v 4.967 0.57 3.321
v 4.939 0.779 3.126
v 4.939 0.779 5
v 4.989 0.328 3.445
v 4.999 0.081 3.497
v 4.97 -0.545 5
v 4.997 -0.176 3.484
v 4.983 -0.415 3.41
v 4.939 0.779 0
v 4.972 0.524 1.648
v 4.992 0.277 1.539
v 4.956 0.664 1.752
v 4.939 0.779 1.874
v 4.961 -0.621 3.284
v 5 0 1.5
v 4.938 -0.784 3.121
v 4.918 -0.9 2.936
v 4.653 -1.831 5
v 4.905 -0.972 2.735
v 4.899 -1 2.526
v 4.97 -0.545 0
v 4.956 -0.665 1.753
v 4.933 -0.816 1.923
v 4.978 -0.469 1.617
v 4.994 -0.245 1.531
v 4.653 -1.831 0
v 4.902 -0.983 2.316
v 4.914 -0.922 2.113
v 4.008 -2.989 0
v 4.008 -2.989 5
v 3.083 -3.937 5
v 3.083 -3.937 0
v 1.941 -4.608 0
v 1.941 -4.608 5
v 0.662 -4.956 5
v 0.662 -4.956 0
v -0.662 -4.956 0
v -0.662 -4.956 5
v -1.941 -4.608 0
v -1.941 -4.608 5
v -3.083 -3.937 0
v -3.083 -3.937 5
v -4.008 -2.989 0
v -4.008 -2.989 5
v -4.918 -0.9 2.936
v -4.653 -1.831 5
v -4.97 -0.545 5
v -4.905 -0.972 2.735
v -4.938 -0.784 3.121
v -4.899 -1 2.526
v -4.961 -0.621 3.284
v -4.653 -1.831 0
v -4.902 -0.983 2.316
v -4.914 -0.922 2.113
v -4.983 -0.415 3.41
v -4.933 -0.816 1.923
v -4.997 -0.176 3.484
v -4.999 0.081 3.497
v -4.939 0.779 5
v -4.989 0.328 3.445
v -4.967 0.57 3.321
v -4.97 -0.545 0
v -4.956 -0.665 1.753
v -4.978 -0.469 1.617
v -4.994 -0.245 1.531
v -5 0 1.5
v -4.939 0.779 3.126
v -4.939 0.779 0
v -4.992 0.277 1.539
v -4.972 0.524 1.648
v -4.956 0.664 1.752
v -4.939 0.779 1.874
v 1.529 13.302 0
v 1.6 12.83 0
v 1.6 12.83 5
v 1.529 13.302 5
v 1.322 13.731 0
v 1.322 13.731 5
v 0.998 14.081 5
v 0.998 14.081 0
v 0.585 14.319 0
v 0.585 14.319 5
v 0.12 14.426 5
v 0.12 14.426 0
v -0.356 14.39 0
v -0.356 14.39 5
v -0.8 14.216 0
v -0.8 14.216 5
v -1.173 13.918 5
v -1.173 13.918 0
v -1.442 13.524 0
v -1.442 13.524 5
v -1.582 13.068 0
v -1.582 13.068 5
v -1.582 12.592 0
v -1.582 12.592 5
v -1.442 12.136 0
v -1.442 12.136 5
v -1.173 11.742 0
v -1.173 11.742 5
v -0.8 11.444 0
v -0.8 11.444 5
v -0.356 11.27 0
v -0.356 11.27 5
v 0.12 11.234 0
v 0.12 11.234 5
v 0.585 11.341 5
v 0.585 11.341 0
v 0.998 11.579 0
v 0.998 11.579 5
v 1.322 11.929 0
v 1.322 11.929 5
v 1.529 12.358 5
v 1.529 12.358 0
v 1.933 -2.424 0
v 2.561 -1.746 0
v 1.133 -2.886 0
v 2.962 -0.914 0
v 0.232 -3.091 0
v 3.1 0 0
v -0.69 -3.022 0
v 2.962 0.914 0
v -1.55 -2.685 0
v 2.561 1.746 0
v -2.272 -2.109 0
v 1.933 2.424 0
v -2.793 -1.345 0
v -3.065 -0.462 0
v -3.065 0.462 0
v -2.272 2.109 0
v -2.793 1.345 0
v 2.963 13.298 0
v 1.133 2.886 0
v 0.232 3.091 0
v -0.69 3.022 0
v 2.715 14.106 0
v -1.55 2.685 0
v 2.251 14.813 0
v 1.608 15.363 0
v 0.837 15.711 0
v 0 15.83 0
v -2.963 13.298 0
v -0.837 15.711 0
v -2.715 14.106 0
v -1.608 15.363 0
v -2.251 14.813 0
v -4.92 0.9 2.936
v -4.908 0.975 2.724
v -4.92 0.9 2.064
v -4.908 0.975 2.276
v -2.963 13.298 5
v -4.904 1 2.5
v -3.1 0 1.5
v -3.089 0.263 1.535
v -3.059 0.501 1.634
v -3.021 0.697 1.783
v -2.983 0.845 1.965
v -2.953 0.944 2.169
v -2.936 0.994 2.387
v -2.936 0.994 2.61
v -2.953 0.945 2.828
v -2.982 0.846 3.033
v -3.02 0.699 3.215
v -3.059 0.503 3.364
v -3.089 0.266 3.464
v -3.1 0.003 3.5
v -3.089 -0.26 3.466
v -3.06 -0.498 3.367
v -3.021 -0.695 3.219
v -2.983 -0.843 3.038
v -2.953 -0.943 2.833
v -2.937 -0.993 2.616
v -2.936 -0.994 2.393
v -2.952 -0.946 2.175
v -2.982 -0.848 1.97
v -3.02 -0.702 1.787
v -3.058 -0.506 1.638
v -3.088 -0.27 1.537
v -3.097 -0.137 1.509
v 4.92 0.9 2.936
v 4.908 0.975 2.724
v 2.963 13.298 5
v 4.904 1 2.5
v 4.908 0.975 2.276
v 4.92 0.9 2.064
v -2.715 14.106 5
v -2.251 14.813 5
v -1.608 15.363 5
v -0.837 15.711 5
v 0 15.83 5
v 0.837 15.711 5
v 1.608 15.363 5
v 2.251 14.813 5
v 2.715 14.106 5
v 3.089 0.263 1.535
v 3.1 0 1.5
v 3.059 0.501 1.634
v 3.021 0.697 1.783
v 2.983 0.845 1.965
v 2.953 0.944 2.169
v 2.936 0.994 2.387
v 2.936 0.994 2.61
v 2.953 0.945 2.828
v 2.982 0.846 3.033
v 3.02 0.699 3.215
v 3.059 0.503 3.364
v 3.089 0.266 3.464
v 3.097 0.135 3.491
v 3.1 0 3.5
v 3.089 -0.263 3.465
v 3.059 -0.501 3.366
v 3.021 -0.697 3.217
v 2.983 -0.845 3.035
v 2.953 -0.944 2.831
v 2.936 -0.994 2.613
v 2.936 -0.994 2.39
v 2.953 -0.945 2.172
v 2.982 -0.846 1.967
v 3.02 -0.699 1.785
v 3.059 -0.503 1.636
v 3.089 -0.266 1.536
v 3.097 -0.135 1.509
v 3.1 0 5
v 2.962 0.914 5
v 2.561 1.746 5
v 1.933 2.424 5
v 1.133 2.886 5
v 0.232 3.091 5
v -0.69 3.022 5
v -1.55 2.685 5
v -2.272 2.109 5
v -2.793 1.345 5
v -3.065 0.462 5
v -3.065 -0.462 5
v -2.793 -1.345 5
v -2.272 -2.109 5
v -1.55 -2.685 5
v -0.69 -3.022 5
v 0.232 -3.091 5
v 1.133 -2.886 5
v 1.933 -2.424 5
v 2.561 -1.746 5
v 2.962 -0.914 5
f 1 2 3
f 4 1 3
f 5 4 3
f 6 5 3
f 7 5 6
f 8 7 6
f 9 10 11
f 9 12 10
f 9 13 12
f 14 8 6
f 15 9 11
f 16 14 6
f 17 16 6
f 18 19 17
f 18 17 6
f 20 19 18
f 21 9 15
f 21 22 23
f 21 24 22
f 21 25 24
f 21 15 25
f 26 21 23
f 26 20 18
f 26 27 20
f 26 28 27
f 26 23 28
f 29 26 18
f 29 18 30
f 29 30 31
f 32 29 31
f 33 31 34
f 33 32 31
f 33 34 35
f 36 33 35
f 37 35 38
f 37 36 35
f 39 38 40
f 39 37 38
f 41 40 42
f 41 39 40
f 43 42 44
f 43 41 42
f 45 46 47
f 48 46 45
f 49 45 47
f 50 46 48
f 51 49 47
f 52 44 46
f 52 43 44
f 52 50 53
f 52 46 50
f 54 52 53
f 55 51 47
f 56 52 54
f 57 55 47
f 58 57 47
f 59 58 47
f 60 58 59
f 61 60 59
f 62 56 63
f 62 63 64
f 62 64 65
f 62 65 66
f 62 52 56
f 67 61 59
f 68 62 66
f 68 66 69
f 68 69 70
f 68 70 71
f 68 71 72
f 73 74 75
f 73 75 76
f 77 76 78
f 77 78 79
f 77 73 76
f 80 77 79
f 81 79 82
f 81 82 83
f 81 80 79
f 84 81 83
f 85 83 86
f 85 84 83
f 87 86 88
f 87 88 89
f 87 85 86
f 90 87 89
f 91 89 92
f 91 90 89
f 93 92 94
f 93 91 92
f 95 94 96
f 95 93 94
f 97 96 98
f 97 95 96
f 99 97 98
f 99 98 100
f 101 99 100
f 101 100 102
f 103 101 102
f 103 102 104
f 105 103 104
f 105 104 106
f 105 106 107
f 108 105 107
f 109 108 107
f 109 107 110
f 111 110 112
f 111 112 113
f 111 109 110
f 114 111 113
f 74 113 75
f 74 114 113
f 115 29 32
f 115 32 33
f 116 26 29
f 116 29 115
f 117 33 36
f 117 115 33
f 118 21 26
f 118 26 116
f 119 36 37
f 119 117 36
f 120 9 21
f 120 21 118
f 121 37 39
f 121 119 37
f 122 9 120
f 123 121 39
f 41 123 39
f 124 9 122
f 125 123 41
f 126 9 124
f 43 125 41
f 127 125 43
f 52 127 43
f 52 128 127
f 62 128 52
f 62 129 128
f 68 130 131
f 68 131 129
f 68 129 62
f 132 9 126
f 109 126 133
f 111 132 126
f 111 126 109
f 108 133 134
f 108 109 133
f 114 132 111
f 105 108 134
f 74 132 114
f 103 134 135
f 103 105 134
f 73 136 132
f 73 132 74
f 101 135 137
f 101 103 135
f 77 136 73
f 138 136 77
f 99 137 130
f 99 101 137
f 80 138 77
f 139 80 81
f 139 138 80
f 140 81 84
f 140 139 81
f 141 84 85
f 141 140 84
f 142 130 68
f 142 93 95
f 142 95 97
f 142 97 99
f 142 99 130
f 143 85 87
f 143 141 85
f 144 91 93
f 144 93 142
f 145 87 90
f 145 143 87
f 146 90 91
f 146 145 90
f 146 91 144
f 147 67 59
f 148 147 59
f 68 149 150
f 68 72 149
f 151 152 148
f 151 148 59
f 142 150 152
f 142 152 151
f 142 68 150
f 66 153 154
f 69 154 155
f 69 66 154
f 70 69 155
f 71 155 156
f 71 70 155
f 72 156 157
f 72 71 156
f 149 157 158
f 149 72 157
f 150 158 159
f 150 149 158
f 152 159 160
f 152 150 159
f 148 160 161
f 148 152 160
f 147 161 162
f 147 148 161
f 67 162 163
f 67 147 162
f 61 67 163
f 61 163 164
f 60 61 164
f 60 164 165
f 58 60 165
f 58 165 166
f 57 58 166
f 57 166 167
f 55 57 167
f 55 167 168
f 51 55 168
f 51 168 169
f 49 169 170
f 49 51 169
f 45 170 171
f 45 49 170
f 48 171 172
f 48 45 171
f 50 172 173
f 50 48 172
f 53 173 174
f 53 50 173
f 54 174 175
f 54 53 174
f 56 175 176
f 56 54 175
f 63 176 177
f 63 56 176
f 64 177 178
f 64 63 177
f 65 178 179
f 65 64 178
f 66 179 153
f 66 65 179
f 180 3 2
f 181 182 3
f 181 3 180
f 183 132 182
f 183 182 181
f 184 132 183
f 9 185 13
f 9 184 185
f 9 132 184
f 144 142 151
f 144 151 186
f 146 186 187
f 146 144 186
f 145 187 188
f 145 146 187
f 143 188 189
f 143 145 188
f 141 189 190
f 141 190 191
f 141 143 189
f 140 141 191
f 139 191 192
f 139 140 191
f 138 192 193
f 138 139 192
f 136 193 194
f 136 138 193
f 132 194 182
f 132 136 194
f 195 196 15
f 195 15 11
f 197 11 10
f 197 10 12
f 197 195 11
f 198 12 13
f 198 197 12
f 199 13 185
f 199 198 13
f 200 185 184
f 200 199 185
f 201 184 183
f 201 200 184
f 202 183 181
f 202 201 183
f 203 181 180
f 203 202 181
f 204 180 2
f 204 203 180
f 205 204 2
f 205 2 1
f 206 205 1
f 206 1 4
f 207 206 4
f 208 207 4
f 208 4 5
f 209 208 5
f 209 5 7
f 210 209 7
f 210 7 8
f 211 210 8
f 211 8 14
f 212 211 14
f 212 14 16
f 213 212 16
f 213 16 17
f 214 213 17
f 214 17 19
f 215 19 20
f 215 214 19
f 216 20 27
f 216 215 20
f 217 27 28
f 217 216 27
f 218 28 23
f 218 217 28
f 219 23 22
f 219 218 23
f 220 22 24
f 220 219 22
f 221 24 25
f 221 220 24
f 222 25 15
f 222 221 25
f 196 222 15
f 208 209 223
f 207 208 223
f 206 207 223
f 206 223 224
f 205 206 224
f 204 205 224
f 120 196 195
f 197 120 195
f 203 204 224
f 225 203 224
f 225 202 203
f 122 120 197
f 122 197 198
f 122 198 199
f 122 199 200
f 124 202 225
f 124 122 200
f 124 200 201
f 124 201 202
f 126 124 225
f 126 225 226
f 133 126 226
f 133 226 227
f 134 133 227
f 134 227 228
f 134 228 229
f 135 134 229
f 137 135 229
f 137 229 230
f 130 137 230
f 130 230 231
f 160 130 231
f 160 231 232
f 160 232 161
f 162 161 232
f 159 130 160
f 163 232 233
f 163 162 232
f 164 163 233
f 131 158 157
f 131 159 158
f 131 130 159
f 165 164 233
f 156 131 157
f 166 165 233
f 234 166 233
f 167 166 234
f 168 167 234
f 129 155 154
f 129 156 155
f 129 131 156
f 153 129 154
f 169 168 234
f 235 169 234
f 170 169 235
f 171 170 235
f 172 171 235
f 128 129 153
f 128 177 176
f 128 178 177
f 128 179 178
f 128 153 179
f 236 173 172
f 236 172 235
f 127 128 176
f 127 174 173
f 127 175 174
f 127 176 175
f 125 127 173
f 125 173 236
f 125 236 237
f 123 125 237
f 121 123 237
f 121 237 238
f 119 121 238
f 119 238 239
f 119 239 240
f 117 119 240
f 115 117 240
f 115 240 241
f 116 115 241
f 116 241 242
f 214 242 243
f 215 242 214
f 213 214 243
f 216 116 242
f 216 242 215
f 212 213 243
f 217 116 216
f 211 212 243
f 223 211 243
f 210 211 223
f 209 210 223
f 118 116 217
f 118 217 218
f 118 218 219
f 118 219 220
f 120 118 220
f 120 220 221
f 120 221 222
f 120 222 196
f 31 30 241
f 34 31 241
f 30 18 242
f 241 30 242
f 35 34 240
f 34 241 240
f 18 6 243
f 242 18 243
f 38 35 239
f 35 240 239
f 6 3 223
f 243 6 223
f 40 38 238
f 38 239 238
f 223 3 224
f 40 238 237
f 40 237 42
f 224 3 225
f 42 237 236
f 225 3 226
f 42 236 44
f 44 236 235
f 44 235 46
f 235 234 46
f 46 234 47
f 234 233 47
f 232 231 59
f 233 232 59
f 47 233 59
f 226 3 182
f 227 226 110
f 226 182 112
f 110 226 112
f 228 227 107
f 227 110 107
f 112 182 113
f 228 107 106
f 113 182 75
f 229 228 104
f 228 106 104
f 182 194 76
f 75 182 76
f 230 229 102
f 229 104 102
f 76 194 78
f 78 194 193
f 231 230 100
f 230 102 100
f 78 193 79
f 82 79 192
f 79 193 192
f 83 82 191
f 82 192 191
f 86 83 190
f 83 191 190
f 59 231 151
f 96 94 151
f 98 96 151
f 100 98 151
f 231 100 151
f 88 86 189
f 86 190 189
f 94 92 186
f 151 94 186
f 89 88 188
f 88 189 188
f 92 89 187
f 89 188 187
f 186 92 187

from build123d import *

# Parameters (mm, degrees)
CROQUIS1_R                 = 3.1
CROQUIS1_R_2               = 1.6
SALIENTE_EXTRUIR1_DEPTH    = 5
CORTAR_EXTRUIR1_DEPTH      = 18.33749982
CORTAR_EXTRUIR1_DEPTH_BACK = 18.33749982
CROQUIS3_R                 = 1


with BuildPart() as part:
    # Croquis1 → Saliente-Extruir1 (new body)
    with BuildSketch(Plane.XY):
        with BuildLine():
            Line((-4.938876333, 0.779423227), (-2.9633258, 13.297653936))
            ThreePointArc((-2.9633258, 13.297653936), (0, 15.83), (2.9633258, 13.297653936))
            Line((2.9633258, 13.297653936), (4.938876333, 0.779423227))
            ThreePointArc((4.938876333, 0.779423227), (0, -5), (-4.938876333, 0.779423227))
        make_face()
        Circle(CROQUIS1_R, mode=Mode.SUBTRACT)
        with Locations((0, 12.83)):
            Circle(CROQUIS1_R_2, mode=Mode.SUBTRACT)
    extrude(amount=SALIENTE_EXTRUIR1_DEPTH)

    # Croquis3 → Cortar-Extruir1 (cut, two sides: drawn at the far end of the back side and taken through both)
    with BuildSketch(Plane(origin=(0, 0, 0), x_dir=(0, 0, -1), z_dir=(1, 0, 0)).offset(-CORTAR_EXTRUIR1_DEPTH_BACK)):
        with Locations((-2.5, 0)):
            Circle(CROQUIS3_R)
    extrude(amount=CORTAR_EXTRUIR1_DEPTH + CORTAR_EXTRUIR1_DEPTH_BACK, mode=Mode.SUBTRACT)


solid = part.part
